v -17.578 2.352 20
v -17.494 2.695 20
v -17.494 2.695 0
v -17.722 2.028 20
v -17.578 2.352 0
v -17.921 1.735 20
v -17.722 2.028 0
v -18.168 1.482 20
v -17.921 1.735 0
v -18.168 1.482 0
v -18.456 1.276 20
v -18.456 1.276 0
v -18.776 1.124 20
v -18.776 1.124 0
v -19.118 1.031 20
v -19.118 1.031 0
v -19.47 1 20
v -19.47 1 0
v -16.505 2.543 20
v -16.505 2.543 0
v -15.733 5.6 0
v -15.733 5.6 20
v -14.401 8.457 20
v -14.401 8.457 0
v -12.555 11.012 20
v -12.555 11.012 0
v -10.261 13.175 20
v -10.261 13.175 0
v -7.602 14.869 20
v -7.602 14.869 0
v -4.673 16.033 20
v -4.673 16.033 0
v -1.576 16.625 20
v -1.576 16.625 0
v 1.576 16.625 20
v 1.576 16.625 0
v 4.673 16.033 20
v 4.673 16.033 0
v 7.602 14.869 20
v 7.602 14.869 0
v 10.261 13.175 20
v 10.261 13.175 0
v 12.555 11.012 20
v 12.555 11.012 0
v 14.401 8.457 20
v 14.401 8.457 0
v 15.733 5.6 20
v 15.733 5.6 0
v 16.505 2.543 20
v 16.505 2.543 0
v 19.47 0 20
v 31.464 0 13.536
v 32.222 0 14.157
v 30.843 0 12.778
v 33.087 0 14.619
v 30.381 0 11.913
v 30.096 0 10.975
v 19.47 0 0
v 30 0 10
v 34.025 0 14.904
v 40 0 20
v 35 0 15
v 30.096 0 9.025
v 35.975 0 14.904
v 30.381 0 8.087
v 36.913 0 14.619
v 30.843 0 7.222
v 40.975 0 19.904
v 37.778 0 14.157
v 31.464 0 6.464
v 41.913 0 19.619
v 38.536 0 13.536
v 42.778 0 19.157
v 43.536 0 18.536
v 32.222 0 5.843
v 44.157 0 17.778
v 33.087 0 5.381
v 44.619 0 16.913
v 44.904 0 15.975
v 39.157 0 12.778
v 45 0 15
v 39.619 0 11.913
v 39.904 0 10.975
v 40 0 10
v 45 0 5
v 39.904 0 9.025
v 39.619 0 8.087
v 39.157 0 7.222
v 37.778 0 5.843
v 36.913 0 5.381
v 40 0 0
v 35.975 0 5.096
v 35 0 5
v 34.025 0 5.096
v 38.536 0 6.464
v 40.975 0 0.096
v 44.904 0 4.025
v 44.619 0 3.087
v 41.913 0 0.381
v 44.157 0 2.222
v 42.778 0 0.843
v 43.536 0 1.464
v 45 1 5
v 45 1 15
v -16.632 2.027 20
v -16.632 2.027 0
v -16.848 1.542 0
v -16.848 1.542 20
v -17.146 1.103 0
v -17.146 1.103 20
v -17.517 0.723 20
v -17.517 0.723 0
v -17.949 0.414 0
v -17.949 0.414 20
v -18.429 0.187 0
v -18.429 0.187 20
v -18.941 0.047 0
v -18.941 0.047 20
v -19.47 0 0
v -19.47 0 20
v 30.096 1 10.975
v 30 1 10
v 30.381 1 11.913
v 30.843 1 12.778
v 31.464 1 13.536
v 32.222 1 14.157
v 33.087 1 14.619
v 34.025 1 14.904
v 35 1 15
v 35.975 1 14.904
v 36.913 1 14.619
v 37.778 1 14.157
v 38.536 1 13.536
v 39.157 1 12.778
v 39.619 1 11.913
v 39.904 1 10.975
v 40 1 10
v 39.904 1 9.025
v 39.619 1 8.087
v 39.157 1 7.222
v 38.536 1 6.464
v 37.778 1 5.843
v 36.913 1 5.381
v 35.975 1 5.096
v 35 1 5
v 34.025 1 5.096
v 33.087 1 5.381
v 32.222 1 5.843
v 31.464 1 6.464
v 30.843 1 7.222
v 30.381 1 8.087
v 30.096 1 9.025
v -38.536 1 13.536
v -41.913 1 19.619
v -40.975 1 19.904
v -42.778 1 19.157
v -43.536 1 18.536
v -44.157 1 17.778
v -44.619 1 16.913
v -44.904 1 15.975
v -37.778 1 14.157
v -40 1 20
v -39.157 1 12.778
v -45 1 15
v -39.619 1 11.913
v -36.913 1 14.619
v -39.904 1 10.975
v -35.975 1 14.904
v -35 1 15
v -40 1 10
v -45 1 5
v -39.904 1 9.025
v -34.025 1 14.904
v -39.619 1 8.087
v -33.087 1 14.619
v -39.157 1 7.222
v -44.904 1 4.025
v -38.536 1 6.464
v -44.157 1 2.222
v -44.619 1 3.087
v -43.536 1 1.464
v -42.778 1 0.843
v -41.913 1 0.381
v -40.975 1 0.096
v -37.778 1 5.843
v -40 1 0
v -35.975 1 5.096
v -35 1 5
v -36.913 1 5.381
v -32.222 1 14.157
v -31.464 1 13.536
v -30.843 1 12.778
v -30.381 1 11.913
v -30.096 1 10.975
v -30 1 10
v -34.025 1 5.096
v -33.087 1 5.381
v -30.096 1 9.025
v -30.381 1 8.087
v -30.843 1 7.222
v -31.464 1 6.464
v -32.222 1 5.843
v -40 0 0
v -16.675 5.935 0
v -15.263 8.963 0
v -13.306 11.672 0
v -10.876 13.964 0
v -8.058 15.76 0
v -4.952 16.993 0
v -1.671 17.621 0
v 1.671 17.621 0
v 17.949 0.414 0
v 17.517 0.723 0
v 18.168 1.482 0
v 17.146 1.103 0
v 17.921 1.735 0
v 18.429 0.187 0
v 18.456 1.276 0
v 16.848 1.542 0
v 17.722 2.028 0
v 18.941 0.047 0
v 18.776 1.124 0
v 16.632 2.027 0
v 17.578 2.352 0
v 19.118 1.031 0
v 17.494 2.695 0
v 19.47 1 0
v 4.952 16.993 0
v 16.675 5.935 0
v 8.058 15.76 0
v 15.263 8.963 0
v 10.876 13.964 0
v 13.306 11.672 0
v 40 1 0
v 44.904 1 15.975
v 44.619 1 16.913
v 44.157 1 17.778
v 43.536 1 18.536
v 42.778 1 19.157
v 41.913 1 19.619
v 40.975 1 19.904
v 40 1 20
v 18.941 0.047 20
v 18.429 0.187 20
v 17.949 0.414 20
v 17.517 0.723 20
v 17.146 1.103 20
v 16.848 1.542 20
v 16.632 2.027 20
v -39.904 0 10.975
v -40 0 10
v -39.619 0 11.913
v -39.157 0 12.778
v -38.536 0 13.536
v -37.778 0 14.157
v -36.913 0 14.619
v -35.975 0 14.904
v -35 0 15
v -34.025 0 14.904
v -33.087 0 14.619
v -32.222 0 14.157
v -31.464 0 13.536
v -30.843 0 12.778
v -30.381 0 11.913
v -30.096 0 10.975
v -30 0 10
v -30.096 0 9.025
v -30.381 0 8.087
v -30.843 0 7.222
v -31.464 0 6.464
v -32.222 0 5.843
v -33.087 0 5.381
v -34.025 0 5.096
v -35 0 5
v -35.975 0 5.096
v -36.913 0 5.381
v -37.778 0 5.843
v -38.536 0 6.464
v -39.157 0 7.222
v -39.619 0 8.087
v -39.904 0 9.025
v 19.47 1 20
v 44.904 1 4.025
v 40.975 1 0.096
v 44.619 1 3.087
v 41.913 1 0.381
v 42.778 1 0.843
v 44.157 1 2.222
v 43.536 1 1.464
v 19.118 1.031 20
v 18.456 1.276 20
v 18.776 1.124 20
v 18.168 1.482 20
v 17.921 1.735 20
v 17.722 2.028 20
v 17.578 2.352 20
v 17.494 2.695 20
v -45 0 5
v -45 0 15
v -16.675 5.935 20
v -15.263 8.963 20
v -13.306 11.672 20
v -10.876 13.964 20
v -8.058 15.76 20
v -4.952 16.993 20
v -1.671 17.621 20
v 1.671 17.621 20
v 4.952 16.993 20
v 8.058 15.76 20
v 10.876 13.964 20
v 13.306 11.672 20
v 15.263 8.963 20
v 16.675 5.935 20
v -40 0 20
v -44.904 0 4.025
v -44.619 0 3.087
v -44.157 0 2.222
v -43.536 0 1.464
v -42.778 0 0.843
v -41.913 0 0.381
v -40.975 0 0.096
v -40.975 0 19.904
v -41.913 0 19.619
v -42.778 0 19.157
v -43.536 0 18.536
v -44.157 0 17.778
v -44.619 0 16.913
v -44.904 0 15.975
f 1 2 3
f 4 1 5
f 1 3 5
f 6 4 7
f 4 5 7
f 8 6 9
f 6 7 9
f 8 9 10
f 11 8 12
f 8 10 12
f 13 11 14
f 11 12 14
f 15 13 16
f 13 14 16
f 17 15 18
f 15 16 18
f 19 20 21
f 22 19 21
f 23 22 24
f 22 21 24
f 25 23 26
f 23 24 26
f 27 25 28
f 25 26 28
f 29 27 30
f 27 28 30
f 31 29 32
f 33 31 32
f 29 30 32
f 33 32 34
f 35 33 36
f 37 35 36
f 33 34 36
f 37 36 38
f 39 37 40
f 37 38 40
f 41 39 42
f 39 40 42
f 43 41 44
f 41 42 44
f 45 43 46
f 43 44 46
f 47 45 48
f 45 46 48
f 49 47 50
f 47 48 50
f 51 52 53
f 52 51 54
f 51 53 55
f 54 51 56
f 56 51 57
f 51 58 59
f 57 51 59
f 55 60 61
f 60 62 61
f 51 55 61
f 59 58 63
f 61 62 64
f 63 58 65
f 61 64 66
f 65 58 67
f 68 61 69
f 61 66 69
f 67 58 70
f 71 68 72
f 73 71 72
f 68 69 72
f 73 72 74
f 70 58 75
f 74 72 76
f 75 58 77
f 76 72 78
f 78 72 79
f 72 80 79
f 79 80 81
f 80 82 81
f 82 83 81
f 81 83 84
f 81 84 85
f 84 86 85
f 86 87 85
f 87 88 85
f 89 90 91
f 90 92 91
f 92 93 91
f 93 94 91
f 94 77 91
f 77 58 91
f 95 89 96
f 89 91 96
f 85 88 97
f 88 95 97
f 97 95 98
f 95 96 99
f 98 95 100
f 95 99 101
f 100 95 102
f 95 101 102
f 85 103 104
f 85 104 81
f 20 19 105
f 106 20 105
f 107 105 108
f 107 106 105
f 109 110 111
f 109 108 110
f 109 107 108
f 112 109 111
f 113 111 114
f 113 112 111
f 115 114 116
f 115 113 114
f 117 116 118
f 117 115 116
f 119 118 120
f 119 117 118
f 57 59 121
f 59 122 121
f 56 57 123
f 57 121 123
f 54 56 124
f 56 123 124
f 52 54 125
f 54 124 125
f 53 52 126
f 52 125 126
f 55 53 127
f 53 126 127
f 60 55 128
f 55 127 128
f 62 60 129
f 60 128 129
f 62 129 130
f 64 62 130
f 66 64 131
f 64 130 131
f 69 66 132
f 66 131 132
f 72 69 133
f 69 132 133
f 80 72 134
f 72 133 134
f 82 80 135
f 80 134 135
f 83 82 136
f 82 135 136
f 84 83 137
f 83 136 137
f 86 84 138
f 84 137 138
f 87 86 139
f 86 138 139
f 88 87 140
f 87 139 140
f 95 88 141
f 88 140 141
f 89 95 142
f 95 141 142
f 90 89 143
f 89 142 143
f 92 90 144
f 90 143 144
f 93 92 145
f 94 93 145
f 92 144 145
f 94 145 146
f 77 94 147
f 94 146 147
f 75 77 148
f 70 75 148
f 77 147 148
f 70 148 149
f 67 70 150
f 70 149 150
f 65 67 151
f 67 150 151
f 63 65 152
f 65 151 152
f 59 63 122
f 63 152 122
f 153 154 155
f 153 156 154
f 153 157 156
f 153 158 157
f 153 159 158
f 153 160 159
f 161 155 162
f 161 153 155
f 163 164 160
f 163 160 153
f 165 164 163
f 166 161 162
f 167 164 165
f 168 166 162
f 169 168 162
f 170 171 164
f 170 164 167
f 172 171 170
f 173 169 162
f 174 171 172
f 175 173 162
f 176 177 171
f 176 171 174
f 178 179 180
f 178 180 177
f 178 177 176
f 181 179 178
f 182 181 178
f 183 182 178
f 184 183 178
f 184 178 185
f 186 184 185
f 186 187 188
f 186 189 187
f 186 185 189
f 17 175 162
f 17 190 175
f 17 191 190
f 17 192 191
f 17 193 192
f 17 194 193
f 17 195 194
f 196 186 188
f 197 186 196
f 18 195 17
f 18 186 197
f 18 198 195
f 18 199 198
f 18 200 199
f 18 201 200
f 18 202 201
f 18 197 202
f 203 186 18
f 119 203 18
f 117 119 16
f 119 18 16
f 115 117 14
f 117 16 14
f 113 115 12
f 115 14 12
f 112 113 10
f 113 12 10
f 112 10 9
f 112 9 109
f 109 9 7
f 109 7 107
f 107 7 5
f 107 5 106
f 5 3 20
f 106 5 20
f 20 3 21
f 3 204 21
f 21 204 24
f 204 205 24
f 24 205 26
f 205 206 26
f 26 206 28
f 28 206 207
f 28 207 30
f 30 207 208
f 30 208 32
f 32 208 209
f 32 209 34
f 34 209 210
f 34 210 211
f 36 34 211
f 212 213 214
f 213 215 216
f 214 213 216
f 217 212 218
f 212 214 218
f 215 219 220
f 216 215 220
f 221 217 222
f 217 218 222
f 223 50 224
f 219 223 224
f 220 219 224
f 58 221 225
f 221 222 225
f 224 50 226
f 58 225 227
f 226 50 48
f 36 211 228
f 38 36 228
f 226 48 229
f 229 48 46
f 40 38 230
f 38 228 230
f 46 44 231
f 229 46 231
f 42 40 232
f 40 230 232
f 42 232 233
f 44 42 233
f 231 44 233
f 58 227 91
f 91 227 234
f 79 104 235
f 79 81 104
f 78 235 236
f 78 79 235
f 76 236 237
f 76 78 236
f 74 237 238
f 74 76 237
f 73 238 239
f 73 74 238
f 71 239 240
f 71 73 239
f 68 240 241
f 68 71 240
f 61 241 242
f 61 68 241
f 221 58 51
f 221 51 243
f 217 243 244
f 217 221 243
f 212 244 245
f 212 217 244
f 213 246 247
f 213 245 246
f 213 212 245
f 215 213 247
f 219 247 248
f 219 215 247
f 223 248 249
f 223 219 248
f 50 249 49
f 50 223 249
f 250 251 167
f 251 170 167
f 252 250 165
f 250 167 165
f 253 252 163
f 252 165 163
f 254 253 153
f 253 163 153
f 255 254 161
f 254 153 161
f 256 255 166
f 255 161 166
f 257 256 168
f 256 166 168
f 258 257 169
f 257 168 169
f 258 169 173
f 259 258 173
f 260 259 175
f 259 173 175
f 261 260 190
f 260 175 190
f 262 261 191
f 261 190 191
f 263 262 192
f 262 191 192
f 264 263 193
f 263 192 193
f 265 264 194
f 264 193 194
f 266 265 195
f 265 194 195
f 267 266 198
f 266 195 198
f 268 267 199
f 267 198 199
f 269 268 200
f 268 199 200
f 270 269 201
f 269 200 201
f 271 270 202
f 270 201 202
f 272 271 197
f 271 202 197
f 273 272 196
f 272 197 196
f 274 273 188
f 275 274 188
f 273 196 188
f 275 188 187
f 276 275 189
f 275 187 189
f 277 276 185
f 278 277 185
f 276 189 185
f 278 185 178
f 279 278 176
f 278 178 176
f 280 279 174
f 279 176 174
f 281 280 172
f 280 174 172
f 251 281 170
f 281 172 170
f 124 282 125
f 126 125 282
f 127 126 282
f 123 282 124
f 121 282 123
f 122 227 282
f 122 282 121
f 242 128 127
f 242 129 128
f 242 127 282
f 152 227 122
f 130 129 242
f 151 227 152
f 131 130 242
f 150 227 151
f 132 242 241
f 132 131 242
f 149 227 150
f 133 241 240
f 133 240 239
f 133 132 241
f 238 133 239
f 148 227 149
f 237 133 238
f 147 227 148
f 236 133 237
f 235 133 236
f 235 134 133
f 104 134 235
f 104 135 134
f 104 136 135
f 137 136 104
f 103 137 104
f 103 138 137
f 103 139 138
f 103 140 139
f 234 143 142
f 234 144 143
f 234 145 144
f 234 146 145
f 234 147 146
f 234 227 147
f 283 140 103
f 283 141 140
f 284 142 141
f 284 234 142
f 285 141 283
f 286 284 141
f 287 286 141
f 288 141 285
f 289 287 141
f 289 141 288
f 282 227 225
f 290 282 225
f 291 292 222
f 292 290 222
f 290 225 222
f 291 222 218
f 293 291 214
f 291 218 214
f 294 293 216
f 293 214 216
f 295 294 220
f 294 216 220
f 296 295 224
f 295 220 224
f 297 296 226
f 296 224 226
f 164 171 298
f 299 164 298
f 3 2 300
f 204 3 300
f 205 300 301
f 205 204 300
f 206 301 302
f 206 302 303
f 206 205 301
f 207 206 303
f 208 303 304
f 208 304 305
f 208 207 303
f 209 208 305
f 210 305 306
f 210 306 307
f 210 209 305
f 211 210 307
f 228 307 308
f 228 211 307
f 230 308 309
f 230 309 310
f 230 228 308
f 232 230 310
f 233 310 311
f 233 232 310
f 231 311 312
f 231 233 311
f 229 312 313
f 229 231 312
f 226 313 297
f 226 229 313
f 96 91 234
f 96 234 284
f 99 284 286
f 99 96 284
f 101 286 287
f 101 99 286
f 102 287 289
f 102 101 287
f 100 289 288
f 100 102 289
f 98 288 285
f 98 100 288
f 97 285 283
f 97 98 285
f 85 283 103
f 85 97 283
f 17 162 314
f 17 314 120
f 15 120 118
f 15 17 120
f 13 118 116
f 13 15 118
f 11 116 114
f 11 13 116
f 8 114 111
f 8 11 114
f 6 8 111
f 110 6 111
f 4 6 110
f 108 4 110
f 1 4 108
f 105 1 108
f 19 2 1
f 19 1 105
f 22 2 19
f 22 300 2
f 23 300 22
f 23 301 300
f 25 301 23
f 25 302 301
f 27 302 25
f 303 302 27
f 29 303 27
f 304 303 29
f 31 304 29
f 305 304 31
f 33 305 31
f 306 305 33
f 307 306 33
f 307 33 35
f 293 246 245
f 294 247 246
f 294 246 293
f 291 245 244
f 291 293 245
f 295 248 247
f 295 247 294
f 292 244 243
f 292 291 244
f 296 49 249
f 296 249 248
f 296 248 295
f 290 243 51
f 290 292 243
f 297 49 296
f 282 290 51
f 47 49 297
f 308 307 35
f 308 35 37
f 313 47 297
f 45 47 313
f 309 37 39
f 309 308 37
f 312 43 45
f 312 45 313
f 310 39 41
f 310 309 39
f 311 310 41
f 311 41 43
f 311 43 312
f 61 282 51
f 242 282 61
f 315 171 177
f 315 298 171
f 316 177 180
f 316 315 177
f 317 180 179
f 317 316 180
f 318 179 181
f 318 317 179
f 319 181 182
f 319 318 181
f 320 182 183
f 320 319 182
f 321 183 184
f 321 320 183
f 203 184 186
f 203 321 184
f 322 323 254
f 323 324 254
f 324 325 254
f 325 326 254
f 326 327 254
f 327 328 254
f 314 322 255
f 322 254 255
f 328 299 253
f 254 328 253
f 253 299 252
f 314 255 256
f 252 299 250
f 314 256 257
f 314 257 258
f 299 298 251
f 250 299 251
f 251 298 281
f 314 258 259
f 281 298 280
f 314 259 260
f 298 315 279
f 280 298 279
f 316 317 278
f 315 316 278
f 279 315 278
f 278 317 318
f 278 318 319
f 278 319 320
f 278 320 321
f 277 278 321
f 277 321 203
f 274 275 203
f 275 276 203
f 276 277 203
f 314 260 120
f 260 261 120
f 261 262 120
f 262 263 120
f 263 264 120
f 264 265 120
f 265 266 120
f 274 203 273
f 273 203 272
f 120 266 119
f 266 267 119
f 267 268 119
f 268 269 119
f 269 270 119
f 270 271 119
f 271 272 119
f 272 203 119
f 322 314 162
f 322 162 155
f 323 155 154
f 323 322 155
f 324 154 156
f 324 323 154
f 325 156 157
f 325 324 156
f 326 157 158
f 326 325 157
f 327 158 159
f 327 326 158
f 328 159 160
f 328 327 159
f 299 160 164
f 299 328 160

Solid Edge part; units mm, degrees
sketch "Sketch1" plane through (0, 0, 0) normal (0, 0, 1) x (1, 0, 0)
  line L0 (19.4702, 0) -> (45, 0)
  line L1 (45, 1) -> (45, 0)
  line L2 (19.4702, 1) -> (45, 1)
  arc A0 (17.4936, 2.6954) -> (19.4702, 1) centre (19.4702, 3) ccw
  arc A1 (-17.4936, 2.6954) -> (17.4936, 2.6954) centre (0, 0) cw
  arc A2 (-19.4702, 1) -> (-17.4936, 2.6954) centre (-19.4702, 3) ccw
  line L3 (-45, 1) -> (-19.4702, 1)
  line L4 (-45, 1) -> (-45, 0)
  line L5 (-45, 0) -> (-19.4702, 0)
  arc A3 (-19.4702, 0) -> (-16.5052, 2.5431) centre (-19.4702, 3) ccw
  arc A4 (16.5052, 2.5431) -> (19.4702, 0) centre (19.4702, 3) ccw
  arc A5 (-16.5052, 2.5431) -> (16.5052, 2.5431) centre (0, 0) cw
extrude "Protrusion1" add sketch "Sketch1" along normal blind 20
sketch "Sketch2" plane through (-32.2351, 1, 10) normal (0, 1, 0) x (-1, 0, 0)
  circle A0 centre (2.7649, 0) radius 5
  circle A1 centre (-67.2351, 0) radius 5
  dimension "D1" = 10
  dimension "D2" = 10
  dimension "D3" = 10
extrude "Cutout1" cut sketch "Sketch2" against normal up to next
fillet "Round_1" radius 5 4 edges at (-45, 0.5, 20) (-45, 0.5, 0) (45, 0.5, 20) (45, 0.5, 0)
properties material "Steel, structural"
